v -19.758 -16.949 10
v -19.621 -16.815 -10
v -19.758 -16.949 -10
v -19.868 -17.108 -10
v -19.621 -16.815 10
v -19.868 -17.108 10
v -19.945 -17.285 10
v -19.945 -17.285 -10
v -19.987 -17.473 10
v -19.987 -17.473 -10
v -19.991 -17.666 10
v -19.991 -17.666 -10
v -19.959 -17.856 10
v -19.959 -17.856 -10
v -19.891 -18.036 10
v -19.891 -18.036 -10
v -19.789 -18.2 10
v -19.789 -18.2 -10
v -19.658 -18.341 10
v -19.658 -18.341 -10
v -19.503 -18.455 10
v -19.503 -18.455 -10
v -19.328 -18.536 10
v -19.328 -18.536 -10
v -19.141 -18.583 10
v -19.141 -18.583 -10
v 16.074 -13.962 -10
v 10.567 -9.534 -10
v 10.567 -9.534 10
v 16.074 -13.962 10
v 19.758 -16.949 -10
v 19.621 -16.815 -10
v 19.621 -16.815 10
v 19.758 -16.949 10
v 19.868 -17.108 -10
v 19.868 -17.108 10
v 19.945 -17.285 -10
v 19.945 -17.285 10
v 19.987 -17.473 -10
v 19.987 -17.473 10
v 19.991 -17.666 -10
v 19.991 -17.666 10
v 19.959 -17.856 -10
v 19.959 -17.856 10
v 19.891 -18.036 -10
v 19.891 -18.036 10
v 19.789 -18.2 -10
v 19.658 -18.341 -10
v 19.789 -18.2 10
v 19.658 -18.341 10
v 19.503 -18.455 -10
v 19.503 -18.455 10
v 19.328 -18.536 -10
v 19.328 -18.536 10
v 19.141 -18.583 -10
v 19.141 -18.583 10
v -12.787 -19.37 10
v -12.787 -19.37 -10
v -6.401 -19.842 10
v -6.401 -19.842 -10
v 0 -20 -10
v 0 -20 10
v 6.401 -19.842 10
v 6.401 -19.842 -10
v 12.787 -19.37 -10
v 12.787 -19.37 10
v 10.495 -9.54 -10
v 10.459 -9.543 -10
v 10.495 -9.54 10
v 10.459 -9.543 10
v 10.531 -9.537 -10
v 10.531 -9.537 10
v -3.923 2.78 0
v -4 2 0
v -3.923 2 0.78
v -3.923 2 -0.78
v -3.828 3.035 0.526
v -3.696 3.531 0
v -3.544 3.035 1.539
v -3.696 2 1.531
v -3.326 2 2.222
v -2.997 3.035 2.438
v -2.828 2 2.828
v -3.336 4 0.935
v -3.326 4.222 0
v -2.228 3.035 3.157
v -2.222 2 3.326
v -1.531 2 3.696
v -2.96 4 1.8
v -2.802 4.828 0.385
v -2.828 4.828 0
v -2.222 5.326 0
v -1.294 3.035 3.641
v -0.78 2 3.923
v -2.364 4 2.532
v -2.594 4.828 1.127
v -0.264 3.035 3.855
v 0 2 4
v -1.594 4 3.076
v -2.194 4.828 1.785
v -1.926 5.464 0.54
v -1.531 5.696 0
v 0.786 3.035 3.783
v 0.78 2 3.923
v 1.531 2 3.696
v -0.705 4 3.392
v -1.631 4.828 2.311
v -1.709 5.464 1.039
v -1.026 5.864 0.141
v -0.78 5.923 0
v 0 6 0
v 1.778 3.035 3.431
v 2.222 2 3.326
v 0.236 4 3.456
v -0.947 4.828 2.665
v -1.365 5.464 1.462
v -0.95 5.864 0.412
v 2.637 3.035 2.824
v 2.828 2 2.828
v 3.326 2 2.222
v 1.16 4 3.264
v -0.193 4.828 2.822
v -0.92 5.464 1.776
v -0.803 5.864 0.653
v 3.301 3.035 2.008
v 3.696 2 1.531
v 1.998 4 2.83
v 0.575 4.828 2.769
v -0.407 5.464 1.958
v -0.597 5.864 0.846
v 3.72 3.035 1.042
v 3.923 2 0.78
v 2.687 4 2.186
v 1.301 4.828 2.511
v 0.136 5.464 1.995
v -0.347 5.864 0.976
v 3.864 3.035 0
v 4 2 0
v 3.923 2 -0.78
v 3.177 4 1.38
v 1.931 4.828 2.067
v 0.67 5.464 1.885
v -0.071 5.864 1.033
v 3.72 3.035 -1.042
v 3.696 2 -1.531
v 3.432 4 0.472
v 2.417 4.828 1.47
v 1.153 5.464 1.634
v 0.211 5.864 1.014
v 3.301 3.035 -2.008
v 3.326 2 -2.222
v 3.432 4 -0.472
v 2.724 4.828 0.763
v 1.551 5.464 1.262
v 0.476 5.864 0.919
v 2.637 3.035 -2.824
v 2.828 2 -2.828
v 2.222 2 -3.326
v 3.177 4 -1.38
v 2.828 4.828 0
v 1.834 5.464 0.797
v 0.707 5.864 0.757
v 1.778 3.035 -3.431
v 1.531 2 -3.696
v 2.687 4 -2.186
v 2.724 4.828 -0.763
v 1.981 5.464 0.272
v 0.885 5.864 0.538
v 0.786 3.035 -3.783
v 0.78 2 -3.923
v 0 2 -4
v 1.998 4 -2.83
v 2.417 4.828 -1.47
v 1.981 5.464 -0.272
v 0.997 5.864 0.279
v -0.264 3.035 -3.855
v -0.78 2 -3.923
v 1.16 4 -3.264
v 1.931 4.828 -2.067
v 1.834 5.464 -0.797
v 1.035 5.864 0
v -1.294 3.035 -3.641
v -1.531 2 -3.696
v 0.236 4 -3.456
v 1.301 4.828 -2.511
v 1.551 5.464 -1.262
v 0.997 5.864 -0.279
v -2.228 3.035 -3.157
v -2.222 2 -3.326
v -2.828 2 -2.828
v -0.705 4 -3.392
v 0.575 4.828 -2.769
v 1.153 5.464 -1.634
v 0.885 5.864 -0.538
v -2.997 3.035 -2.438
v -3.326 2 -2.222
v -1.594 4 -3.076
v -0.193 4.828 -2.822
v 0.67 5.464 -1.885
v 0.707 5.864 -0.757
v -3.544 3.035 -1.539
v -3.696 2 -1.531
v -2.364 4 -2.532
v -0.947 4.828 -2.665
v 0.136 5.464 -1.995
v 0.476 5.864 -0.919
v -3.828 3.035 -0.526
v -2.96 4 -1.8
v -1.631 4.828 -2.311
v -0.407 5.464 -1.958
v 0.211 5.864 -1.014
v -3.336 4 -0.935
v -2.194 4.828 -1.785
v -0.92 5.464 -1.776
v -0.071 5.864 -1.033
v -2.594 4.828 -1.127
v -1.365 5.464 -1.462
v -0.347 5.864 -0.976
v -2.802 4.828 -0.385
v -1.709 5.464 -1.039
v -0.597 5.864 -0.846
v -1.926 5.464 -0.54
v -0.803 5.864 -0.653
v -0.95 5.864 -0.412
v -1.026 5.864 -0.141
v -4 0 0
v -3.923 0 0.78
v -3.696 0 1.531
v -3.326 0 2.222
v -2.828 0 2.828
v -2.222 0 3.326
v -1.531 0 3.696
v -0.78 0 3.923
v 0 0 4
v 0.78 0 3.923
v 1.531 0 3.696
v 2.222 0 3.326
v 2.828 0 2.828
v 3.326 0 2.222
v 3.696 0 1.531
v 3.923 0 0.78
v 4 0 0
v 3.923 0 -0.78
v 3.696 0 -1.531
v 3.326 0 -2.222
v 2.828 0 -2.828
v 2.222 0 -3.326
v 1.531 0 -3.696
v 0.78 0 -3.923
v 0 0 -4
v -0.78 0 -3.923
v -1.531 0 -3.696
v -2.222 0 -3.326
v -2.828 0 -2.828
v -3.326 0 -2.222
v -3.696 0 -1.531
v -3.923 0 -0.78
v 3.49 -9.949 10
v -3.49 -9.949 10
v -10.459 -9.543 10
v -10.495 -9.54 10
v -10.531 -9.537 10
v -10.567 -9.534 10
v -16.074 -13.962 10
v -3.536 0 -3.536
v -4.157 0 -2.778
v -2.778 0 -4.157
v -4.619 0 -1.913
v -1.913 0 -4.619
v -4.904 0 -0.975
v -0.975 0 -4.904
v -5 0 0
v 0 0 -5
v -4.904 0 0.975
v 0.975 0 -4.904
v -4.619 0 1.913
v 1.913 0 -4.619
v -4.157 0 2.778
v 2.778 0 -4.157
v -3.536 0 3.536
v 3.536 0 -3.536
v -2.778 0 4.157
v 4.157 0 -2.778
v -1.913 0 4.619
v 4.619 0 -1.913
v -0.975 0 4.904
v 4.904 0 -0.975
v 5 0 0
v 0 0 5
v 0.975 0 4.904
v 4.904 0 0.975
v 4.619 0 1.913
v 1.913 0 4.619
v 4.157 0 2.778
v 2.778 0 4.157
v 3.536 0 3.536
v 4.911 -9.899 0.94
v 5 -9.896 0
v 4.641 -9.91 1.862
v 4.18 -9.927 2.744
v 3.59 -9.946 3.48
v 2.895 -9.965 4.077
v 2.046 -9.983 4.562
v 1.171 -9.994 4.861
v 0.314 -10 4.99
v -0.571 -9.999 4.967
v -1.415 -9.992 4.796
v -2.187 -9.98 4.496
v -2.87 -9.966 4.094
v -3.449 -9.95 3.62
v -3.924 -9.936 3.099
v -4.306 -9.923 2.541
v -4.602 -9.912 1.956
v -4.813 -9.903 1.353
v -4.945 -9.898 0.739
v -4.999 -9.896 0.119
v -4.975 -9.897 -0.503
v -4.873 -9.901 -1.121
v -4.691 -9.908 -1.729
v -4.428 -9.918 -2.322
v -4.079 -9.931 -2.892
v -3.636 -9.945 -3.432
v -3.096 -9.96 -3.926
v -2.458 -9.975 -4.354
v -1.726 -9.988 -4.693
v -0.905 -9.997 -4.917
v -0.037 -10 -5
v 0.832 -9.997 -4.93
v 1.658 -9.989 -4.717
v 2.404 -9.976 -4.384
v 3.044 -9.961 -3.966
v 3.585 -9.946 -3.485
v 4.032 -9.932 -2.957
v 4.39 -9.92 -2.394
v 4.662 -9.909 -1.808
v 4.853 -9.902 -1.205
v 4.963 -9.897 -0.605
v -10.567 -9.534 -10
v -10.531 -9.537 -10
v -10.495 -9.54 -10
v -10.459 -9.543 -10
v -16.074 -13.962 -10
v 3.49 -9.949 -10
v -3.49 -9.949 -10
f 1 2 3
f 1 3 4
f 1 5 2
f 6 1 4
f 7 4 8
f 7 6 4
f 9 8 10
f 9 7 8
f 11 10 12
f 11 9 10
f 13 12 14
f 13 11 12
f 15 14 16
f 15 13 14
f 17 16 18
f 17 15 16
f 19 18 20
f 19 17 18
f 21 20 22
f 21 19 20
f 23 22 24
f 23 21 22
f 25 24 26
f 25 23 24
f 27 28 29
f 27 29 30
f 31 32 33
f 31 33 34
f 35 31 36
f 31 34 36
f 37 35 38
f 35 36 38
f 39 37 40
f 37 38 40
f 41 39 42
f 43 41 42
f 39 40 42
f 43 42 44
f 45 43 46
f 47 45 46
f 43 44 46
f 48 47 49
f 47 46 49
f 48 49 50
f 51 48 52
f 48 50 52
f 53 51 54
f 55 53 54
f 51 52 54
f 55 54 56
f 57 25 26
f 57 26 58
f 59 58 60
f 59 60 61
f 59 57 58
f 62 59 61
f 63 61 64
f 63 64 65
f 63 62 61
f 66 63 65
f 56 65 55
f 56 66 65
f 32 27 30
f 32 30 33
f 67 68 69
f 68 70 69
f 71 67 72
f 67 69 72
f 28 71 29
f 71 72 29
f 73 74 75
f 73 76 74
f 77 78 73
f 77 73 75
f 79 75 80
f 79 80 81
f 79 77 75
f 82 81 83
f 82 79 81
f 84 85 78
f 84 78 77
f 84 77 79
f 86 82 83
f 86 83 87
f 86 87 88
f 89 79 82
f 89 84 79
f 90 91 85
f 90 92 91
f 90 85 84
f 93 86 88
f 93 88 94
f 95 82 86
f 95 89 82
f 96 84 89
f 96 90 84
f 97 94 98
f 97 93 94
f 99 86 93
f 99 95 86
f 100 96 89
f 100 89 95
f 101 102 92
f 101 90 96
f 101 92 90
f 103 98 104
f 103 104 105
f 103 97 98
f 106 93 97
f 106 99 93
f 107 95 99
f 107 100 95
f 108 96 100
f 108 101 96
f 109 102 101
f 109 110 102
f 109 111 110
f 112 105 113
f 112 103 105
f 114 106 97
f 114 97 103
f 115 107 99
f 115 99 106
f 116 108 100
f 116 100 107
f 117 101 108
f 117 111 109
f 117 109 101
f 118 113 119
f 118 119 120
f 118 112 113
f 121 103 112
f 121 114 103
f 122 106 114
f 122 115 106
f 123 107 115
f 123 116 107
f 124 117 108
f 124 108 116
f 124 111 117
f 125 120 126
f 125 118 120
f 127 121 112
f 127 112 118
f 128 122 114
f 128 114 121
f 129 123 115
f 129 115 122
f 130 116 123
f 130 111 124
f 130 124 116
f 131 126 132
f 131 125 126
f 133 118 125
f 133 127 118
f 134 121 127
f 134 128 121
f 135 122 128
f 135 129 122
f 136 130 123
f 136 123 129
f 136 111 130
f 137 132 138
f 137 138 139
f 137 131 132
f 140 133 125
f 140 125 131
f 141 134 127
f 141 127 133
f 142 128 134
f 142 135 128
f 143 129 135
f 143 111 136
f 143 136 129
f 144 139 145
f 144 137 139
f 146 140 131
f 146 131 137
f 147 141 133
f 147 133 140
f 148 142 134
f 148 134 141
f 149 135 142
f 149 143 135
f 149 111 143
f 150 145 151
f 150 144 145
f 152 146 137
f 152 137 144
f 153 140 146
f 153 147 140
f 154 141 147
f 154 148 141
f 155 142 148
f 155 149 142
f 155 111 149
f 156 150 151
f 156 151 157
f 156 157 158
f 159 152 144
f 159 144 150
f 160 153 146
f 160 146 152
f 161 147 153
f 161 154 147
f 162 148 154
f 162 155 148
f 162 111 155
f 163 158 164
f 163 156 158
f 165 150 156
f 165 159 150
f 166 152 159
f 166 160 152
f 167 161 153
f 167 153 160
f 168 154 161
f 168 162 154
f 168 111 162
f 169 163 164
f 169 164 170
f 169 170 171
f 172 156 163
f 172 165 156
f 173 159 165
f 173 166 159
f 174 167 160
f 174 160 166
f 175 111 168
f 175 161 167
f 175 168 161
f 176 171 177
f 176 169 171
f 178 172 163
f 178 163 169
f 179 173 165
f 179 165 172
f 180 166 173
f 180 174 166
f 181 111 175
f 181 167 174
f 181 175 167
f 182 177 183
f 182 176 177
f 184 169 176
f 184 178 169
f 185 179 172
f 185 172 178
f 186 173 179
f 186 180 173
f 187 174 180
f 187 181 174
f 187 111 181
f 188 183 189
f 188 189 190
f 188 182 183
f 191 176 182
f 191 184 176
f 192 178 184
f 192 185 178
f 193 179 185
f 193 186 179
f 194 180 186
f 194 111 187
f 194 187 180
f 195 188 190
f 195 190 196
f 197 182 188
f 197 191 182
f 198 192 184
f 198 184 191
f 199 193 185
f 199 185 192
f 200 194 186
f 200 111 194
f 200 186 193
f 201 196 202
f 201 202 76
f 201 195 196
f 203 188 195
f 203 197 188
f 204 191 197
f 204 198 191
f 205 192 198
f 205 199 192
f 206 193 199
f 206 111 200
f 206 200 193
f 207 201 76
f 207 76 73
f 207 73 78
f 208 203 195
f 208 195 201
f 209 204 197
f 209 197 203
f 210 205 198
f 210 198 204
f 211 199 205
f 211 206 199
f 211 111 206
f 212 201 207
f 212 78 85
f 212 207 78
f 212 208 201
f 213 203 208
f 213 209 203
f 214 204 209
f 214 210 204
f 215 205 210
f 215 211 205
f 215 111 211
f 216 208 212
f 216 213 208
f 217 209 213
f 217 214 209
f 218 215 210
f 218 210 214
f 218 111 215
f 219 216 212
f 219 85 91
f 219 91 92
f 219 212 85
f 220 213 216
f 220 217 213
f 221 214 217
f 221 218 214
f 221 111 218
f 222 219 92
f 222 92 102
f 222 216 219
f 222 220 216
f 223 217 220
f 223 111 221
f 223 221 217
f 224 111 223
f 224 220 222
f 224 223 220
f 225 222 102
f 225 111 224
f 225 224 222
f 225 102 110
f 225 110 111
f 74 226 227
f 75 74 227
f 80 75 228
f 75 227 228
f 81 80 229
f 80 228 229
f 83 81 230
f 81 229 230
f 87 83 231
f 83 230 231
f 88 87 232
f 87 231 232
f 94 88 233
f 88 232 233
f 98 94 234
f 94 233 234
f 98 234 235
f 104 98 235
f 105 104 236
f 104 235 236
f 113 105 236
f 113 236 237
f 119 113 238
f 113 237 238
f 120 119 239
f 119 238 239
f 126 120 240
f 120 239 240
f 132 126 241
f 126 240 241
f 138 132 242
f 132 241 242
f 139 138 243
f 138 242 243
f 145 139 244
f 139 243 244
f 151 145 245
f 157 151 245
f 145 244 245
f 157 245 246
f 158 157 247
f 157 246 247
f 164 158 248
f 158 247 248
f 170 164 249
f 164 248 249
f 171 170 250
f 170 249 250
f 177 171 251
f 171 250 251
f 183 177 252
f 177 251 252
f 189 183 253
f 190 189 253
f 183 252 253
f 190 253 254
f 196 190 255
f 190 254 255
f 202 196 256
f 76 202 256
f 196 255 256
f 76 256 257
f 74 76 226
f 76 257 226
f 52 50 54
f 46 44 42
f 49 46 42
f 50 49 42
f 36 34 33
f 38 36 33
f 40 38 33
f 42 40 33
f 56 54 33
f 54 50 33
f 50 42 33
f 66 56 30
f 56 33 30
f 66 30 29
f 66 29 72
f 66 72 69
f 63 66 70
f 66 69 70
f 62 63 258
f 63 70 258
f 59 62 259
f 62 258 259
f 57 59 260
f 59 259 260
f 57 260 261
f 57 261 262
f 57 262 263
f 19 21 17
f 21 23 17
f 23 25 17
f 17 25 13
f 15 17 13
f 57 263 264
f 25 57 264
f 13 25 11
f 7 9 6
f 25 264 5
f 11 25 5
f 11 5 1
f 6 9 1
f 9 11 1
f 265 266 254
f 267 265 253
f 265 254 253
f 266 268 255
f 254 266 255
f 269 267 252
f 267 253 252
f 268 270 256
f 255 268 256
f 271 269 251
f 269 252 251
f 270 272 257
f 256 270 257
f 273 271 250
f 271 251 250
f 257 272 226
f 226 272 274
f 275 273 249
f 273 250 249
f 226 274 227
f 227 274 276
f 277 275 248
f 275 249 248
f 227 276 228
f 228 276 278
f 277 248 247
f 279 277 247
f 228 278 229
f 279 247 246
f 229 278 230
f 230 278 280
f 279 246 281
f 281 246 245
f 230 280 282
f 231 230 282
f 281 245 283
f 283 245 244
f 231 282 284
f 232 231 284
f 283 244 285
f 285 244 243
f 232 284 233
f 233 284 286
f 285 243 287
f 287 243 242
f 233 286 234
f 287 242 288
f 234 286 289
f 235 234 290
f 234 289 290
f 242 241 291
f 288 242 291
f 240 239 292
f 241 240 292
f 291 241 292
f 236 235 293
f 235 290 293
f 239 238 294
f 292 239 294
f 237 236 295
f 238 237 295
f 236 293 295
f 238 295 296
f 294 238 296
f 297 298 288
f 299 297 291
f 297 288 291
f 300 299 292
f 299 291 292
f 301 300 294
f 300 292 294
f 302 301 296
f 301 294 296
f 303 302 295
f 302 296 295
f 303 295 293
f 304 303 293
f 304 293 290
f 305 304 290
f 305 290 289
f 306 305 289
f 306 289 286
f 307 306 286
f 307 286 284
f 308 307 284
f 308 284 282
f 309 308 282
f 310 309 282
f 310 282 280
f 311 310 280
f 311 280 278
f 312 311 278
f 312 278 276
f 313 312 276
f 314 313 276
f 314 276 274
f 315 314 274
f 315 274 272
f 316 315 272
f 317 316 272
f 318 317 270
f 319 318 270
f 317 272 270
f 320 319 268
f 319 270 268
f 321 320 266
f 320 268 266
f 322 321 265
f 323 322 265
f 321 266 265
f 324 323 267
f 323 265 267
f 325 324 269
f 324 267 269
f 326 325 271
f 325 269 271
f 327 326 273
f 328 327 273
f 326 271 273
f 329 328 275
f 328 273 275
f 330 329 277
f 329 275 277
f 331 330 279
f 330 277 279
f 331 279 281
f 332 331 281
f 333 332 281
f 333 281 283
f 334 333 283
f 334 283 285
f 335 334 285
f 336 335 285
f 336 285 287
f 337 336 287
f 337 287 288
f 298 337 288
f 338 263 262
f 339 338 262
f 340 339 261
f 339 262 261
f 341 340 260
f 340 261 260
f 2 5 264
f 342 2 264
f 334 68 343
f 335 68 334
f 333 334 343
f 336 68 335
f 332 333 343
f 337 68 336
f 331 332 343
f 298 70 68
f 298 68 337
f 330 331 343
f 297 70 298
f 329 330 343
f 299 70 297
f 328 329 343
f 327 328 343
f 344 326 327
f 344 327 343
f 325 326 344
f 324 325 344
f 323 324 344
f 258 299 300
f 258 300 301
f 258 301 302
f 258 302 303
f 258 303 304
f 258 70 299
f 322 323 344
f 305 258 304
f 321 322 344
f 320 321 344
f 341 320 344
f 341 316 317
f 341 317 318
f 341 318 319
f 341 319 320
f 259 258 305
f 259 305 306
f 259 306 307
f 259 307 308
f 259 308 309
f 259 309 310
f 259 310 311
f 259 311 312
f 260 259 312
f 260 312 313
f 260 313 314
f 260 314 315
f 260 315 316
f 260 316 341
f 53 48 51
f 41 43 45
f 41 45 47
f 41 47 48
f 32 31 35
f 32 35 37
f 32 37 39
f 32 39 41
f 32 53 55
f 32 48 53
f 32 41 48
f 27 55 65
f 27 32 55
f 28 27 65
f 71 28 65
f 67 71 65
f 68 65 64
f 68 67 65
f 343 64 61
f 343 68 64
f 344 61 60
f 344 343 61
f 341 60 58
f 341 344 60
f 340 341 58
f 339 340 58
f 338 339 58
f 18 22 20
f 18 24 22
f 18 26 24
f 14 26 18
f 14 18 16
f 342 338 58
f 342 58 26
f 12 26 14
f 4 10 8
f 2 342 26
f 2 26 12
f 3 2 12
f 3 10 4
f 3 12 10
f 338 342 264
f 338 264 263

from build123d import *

# Parameters (mm, degrees)
F0_R          = 5
F1_DEPTH      = 10
F2_R          = 4
F3_DEPTH      = 6
F4_R          = 4
F6_DEPTH      = 10
F6_DEPTH_BACK = 10
F7_T4_DEPTH   = 20
F7_S5_R       = 120
F7_T6_DEPTH   = 12
F7_T10_DEPTH  = 20
F7_S11_R      = 120
F7_T12_DEPTH  = 12
F9_DEPTH      = 25
F10_R         = 1


# Not quite as in the source:
# - a fillet or chamfer that OpenCascade refuses, or shapes differently, is made with other operations: its cross-section is extruded or revolved along the edge and cut away or added


with BuildPart() as f1:
    # F0 (on Front) → F1 (new body)
    with BuildSketch(Plane.XZ):
        Circle(F0_R)
    extrude(amount=F1_DEPTH)

    # F2 (on face) → F3 (join)
    with BuildSketch(Plane(origin=(0, 0, 0), x_dir=(-1, 0, 0), z_dir=(0, 1, 0))):
        Circle(F2_R)
    extrude(amount=F3_DEPTH)

    # F4
    f4_edges = [f1.edges().sort_by_distance(p)[0] for p in [
        (4, 6, 0),
    ]]
    fillet(f4_edges, radius=F4_R)

    # F5 (on Top) → F6 (join, two sides)
    with BuildSketch(Plane.XY) as f6_sk:
        with BuildLine():
            ThreePointArc((10.4586891297, -9.543363771), (0, -10), (-10.4586891297, -9.543363771))
            Line((-10.4586891297, -9.543363771), (-10.8944678435, -14.5243372615))
            ThreePointArc((-10.8944678435, -14.5243372615), (-16.3157740275, -13.9306076717), (-21.7060222084, -13.1009691265))
            Line((-21.7060222084, -13.1009691265), (-22.5742630967, -18.0250078916))
            ThreePointArc((-22.5742630967, -18.0250078916), (0, -20), (22.5742630967, -18.0250078916))
            Line((22.5742630967, -18.0250078916), (21.7060222084, -13.1009691265))
            ThreePointArc((21.7060222084, -13.1009691265), (16.3157740275, -13.9306076717), (10.8944678435, -14.5243372615))
            Line((10.8944678435, -14.5243372615), (10.4586891297, -9.543363771))
        make_face()
    extrude(amount=F6_DEPTH)
    extrude(f6_sk.sketch, amount=-F6_DEPTH_BACK)

    # F7: chamfer of 5 on 2 edges, made by hand


with BuildPart() as f7_tool2:
    # F7_s3 → F7_t4 (new body)
    with BuildSketch(Plane.XY.offset(-10)):
        with BuildLine():
            Line((-16.0735207845, -13.962260102), (-10.4496064627, -9.4395484116))
            Line((-10.4496064627, -9.4395484116), (-10.8944678435, -14.5243372615))
            ThreePointArc((-10.8944678435, -14.5243372615), (-13.5571939783, -14.262635138), (-16.0735207845, -13.962260102))
        make_face()
    extrude(amount=F7_T4_DEPTH)

    # F7_s5 → F7_t6 (cut, symmetric)
    with BuildSketch(Plane.XY):
        with Locations((0, 110)):
            Circle(F7_S5_R)
    extrude(amount=F7_T6_DEPTH, both=True, mode=Mode.SUBTRACT)


with BuildPart() as f1_1:
    add(f1.part)

    # F7_t1: union F7_tool2
    add(f7_tool2.part)


with BuildPart() as f7_tool8:
    # F7_s9 → F7_t10 (new body)
    with BuildSketch(Plane.XY.offset(10)):
        with BuildLine():
            Line((10.4496064627, -9.4395484116), (16.0735207845, -13.962260102))
            ThreePointArc((16.0735207845, -13.962260102), (13.5571939783, -14.262635138), (10.8944678435, -14.5243372615))
            Line((10.8944678435, -14.5243372615), (10.4496064627, -9.4395484116))
        make_face()
    extrude(amount=-F7_T10_DEPTH)

    # F7_s11 → F7_t12 (cut, symmetric)
    with BuildSketch(Plane.XY):
        with Locations((0, 110)):
            Circle(F7_S11_R)
    extrude(amount=F7_T12_DEPTH, both=True, mode=Mode.SUBTRACT)


with BuildPart() as f1_2:
    add(f1_1.part)

    # F7_t7: union F7_tool8
    add(f7_tool8.part)

    # F8 (on face) → F9 (cut)
    with BuildSketch(Plane.XY.offset(10)):
        Polygon((-22.1401426525, -18.8409940359), (-16.0735207845, -13.962260102), (-26.2115597725, -8.7402015924), (-26.2115597725, -18.8409940359), align=None)
        Polygon((26.2115597725, -8.7402015924), (16.0735207845, -13.962260102), (22.1401426525, -18.8409940359), (26.2115597725, -18.8409940359), align=None)
    extrude(amount=-F9_DEPTH, mode=Mode.SUBTRACT)

    # F10
    f10_edges = [f1_2.edges().sort_by_distance(p)[0] for p in [
        (-21.380167, -18.229827, 0),
        (21.380167, -18.229827, 0),
    ]]
    fillet(f10_edges, radius=F10_R)


solid = f1_2.part
